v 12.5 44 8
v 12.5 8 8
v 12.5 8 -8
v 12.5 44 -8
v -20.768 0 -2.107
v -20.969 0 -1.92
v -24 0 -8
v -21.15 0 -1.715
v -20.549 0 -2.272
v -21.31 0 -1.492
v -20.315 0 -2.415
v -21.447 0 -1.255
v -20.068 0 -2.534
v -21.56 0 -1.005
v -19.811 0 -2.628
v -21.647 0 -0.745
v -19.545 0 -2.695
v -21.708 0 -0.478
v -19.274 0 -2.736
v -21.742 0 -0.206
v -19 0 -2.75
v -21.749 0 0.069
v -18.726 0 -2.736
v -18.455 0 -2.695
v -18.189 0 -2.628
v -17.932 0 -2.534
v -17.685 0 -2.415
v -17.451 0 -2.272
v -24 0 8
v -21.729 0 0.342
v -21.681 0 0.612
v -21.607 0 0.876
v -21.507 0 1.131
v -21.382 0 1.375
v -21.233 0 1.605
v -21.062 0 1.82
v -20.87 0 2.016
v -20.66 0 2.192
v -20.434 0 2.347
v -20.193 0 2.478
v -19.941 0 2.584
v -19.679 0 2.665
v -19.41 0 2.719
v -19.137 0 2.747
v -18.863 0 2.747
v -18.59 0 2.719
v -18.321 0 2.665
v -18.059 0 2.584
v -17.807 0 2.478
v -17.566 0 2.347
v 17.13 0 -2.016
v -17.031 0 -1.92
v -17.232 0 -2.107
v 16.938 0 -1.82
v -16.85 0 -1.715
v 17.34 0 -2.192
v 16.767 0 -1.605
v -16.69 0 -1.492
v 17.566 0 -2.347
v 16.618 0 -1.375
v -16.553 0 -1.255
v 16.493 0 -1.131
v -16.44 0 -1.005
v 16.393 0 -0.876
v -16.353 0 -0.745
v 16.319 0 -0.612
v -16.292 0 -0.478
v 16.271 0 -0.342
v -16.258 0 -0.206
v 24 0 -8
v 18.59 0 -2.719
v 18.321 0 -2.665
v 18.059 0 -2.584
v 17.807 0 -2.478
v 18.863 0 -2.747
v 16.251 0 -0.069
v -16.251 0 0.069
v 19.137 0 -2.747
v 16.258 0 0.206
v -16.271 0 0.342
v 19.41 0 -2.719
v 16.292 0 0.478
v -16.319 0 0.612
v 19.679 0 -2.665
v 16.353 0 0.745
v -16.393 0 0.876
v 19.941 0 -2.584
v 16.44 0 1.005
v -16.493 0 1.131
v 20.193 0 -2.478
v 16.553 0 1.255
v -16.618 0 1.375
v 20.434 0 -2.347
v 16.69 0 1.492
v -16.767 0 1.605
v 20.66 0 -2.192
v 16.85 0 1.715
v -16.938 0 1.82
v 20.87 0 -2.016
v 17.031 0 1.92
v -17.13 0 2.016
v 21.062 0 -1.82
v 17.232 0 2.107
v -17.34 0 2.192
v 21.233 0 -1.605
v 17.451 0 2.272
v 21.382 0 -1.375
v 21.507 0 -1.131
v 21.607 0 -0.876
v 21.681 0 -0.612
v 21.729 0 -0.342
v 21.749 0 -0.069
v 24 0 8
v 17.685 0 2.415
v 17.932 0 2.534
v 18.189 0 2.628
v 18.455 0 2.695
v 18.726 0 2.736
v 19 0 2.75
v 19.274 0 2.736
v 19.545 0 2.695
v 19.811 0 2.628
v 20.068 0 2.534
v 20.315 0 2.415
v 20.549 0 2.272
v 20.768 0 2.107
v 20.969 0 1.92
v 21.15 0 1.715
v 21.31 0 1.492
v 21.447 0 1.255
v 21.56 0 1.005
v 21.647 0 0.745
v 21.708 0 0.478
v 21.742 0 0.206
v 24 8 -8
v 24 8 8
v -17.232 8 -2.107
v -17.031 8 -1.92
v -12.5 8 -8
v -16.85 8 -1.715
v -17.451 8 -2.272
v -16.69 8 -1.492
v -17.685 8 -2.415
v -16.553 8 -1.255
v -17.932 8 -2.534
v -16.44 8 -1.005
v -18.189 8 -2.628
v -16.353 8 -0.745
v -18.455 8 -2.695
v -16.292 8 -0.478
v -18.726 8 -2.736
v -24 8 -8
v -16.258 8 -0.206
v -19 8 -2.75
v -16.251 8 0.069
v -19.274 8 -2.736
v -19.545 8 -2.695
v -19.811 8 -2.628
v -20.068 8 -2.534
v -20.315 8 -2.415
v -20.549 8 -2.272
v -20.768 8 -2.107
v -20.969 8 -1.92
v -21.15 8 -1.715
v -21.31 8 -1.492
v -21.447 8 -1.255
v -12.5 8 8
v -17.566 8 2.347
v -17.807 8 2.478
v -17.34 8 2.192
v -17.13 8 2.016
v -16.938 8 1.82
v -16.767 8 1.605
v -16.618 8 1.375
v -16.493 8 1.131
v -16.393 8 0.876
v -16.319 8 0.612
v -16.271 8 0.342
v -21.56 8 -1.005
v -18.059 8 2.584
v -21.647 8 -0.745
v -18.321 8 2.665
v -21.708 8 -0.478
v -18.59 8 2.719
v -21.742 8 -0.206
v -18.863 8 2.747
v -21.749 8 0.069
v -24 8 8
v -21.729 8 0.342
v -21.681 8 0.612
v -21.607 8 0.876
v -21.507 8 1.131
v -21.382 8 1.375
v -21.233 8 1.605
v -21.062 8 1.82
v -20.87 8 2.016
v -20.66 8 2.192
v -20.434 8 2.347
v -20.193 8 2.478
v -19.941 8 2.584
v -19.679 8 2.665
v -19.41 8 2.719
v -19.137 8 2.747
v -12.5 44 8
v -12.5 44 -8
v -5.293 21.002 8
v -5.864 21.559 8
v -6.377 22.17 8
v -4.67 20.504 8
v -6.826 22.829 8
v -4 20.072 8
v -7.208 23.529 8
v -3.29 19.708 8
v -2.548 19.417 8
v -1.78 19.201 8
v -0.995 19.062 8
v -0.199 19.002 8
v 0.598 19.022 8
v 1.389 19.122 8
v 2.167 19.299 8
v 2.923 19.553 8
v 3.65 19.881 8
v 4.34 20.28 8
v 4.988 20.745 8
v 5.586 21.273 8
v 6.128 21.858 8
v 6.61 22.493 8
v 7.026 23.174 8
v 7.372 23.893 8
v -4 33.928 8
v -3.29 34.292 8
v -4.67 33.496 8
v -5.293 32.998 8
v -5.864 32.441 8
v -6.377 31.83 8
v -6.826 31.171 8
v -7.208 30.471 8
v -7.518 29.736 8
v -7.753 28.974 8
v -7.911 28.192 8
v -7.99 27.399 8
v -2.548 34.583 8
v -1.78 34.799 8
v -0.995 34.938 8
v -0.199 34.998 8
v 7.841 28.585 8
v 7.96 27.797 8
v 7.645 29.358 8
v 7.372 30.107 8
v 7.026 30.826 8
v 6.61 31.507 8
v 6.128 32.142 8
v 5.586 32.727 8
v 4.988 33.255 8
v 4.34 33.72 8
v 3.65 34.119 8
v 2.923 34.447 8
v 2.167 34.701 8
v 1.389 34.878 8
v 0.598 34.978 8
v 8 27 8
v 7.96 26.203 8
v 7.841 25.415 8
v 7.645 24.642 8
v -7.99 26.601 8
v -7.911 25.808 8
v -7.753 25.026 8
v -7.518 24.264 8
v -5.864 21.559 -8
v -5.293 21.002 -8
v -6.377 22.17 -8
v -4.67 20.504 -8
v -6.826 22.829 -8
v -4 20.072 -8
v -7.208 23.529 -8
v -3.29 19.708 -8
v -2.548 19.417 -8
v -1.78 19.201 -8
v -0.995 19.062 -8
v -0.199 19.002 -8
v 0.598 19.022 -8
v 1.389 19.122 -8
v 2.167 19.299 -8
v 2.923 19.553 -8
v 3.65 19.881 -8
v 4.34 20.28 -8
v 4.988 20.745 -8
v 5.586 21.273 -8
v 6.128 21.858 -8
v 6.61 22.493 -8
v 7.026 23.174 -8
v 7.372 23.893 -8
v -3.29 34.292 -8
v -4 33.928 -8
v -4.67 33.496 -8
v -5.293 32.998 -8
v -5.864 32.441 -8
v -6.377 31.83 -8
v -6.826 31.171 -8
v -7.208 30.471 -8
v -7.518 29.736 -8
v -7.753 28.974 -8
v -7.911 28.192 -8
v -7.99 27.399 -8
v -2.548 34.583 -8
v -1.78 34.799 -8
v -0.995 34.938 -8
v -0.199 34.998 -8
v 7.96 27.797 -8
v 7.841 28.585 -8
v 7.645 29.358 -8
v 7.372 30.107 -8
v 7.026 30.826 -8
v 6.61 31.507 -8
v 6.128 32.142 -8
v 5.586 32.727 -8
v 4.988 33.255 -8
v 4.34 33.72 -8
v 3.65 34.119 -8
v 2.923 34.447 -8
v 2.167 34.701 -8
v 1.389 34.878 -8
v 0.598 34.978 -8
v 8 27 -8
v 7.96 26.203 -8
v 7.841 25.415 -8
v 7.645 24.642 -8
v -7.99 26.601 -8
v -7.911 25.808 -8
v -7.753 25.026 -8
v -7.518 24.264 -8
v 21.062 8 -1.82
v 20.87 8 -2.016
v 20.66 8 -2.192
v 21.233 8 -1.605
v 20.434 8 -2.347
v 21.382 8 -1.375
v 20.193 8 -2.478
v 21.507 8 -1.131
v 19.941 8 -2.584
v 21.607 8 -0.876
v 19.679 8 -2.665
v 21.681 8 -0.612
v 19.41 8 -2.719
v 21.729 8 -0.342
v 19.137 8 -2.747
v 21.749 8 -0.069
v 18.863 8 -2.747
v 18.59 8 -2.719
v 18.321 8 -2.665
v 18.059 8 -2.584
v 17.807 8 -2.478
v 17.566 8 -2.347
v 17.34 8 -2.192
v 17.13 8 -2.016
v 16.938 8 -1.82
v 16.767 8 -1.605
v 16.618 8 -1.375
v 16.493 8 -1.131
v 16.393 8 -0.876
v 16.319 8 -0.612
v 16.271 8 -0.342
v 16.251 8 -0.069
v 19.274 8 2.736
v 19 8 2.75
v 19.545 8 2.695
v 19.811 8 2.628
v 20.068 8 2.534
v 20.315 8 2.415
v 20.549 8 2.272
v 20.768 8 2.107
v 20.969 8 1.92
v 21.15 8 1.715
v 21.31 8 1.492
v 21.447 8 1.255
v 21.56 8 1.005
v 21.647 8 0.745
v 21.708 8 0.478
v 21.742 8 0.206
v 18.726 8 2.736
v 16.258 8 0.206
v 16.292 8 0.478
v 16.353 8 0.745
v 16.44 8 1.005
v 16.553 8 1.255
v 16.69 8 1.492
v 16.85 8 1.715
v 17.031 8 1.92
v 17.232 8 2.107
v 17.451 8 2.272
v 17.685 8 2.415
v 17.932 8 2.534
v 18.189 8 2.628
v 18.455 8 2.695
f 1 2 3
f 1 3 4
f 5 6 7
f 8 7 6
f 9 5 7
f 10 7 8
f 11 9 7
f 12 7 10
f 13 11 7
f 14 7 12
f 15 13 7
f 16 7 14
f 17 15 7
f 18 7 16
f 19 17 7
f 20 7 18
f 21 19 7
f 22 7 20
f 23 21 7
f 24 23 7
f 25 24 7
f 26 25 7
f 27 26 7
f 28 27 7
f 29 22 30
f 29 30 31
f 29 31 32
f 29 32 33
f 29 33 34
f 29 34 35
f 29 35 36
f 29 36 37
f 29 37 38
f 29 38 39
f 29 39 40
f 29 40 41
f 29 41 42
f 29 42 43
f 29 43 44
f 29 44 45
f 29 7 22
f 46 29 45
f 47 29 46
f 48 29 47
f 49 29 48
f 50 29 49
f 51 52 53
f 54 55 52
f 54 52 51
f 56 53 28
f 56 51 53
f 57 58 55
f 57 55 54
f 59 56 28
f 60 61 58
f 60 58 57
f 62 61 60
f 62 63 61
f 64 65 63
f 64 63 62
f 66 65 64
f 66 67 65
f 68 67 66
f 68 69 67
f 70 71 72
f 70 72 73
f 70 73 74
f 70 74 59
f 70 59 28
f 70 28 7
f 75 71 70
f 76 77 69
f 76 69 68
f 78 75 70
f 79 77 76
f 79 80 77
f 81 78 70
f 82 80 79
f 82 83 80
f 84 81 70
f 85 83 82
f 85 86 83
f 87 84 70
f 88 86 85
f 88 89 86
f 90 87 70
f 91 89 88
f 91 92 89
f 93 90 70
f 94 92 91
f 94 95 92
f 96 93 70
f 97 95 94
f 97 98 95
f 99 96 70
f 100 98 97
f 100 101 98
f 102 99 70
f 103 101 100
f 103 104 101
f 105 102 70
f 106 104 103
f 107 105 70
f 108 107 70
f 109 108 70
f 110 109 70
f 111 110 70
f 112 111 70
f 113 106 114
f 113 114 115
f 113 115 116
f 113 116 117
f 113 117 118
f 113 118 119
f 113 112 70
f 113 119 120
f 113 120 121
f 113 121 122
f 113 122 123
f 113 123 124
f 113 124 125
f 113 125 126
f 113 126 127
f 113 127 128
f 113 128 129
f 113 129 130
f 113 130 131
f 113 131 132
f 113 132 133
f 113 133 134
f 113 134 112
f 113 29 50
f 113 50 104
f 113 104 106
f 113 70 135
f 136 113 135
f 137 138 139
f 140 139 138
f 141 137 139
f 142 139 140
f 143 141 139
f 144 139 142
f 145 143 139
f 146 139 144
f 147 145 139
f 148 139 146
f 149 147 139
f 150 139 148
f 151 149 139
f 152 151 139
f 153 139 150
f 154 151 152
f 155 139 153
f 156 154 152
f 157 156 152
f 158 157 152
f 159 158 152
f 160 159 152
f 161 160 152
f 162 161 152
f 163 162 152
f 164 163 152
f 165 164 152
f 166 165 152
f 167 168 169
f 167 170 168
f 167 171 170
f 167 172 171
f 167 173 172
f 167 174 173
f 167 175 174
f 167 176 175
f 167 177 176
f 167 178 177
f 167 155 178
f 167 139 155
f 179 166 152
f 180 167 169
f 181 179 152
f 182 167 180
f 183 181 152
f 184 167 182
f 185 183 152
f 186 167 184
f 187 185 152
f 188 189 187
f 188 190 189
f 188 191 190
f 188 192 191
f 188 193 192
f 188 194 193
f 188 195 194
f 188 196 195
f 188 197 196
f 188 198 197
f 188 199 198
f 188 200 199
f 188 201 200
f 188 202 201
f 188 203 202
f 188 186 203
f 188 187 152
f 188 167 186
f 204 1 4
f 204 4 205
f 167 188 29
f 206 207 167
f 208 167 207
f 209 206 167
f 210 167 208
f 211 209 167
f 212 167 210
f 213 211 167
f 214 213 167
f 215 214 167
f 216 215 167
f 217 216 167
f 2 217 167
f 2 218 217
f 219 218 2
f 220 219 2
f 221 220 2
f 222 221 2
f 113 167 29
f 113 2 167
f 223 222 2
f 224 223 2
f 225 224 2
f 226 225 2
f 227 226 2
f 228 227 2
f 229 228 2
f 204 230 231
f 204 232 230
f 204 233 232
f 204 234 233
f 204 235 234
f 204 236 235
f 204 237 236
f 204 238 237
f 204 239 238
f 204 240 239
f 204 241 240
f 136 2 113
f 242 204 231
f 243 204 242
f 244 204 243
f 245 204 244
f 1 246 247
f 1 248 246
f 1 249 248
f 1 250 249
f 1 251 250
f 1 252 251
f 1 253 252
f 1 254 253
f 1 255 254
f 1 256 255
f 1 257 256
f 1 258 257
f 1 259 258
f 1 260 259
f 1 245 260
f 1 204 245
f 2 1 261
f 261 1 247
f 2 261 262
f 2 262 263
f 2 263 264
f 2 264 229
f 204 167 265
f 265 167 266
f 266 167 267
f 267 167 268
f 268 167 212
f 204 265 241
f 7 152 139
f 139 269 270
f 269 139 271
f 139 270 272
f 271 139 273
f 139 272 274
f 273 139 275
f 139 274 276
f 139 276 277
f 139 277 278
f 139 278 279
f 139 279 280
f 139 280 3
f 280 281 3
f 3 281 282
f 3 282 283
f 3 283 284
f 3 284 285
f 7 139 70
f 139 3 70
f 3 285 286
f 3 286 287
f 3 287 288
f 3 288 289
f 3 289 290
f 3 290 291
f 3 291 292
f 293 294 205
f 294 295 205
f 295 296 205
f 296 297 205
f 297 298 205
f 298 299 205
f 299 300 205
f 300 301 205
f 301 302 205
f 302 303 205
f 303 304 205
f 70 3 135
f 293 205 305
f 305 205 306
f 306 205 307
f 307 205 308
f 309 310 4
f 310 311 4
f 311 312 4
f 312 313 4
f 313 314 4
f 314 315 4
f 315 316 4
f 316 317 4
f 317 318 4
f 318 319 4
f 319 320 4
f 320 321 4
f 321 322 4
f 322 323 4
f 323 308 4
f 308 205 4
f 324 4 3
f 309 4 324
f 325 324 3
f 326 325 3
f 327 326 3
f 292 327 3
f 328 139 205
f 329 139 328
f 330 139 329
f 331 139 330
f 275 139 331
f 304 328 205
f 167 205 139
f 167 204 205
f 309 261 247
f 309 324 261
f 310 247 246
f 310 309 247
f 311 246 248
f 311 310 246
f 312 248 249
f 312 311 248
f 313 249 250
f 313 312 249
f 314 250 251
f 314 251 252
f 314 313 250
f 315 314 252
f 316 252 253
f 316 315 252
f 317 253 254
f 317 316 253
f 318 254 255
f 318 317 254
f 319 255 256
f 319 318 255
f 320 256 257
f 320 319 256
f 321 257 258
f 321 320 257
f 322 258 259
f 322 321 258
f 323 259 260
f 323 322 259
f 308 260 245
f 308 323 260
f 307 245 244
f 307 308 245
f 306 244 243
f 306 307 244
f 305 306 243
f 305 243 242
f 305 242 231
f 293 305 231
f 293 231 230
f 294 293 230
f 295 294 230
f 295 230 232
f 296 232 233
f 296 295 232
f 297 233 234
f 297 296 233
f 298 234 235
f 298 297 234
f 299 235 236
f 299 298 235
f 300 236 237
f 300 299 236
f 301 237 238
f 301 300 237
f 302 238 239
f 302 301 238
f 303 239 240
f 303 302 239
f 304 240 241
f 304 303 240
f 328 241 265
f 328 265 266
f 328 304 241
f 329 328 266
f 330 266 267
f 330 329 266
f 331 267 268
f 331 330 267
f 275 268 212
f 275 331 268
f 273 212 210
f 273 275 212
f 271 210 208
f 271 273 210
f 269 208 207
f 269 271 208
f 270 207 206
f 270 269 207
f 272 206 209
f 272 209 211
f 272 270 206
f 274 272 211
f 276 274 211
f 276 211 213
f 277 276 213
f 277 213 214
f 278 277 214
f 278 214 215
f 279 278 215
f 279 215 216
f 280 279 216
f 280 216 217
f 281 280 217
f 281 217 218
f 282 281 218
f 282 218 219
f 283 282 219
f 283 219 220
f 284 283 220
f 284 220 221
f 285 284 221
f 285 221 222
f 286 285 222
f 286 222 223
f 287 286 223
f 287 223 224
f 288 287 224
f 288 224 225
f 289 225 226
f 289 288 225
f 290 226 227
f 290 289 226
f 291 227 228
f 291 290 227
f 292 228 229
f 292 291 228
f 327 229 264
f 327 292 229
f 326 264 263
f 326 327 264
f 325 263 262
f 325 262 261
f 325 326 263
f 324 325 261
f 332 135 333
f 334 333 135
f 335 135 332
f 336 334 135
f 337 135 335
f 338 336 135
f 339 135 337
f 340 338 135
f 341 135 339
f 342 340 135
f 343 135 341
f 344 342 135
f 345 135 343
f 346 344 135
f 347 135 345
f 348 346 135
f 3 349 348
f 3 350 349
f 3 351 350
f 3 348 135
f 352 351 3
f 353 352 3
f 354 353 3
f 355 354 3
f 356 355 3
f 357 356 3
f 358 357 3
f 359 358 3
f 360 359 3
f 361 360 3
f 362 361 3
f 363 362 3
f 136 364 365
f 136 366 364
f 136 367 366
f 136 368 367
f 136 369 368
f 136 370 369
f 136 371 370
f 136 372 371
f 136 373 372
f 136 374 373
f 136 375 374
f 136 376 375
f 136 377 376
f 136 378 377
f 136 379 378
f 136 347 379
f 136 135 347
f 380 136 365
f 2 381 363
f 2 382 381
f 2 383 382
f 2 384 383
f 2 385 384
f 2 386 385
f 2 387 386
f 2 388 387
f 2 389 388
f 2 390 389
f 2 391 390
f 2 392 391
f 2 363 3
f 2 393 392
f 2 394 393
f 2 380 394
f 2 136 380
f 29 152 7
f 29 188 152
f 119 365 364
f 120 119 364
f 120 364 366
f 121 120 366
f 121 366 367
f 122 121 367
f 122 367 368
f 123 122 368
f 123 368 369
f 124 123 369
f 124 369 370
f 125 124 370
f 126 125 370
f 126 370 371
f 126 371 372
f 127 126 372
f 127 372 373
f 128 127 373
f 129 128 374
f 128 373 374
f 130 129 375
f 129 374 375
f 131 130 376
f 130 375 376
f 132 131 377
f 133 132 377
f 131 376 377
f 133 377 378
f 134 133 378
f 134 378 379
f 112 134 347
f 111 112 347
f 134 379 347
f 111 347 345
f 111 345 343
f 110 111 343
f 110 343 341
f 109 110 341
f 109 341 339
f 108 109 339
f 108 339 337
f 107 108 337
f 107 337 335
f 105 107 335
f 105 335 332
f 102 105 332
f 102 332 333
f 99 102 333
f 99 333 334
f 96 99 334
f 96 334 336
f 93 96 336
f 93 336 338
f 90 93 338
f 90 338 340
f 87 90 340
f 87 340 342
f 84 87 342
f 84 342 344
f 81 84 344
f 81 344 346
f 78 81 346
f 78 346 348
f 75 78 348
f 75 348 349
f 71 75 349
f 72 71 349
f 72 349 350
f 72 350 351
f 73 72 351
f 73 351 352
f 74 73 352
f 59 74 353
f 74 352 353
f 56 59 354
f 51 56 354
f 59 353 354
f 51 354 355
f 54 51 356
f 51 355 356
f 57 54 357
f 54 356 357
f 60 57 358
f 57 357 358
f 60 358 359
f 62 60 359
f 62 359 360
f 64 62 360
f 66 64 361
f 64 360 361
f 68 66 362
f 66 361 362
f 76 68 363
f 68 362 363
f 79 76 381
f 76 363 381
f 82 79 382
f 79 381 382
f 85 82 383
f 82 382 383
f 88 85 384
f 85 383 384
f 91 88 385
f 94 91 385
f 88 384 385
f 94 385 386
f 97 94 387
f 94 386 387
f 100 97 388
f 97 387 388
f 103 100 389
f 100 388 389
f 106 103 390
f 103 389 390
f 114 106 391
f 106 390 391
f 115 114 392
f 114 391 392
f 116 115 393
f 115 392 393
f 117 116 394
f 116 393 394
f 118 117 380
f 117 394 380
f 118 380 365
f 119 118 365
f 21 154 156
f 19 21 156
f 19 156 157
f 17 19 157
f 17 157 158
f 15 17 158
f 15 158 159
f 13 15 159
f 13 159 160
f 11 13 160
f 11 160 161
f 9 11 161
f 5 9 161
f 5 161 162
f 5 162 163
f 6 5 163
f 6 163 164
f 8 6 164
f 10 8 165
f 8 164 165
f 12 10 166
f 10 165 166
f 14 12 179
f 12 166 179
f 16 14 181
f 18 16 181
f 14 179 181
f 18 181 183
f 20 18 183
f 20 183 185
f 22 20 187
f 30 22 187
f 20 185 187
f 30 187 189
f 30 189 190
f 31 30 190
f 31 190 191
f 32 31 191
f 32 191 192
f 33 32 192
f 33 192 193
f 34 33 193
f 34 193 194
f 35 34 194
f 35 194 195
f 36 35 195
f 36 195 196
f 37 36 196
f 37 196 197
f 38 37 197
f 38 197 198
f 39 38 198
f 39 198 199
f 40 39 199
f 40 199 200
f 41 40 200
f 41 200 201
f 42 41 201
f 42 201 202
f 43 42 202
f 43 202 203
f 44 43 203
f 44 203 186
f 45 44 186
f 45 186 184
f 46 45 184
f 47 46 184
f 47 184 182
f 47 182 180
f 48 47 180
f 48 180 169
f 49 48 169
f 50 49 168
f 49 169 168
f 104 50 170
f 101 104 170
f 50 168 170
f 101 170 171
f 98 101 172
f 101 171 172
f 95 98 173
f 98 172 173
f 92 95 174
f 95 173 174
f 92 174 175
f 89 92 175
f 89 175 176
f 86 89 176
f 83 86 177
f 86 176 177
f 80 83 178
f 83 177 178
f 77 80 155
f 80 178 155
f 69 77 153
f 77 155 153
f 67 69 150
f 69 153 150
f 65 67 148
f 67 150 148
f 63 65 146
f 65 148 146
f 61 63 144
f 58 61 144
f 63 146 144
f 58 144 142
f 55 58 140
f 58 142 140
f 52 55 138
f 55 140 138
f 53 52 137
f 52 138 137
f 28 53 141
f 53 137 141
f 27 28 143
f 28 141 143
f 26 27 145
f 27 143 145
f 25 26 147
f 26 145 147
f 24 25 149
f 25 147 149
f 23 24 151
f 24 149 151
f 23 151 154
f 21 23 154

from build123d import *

# Parameters (mm, degrees)
SKETCH_1_R          = 8
EXTRUDE_1_DEPTH     = 8
SKETCH_2_R          = 2.75
CUT_EXTRUDE_1_DEPTH = 45


with BuildPart() as part:
    # 草图1 → 凸台-拉伸1 (new, symmetric)
    with BuildSketch(Plane.XY):
        Polygon((-24, 0), (24, 0), (24, 8), (12.5, 8), (12.5, 44), (-12.5, 44), (-12.5, 8), (-24, 8), align=None)
        with Locations((0, 27)):
            Circle(SKETCH_1_R, mode=Mode.SUBTRACT)
    extrude(amount=EXTRUDE_1_DEPTH, both=True)

    # 草图2 → 切除-拉伸1 (cut, through all)
    with BuildSketch(Plane(origin=(0, 8, 0), x_dir=(1, 0, 0), z_dir=(0, 1, 0))):
        with Locations(Location((19, 0, 0), (0, 0, 270))):
            Circle(SKETCH_2_R)
        with Locations(Location((-19, 0, 0), (0, 0, 90))):
            Circle(SKETCH_2_R)
    extrude(amount=-CUT_EXTRUDE_1_DEPTH, mode=Mode.SUBTRACT)


solid = part.part
